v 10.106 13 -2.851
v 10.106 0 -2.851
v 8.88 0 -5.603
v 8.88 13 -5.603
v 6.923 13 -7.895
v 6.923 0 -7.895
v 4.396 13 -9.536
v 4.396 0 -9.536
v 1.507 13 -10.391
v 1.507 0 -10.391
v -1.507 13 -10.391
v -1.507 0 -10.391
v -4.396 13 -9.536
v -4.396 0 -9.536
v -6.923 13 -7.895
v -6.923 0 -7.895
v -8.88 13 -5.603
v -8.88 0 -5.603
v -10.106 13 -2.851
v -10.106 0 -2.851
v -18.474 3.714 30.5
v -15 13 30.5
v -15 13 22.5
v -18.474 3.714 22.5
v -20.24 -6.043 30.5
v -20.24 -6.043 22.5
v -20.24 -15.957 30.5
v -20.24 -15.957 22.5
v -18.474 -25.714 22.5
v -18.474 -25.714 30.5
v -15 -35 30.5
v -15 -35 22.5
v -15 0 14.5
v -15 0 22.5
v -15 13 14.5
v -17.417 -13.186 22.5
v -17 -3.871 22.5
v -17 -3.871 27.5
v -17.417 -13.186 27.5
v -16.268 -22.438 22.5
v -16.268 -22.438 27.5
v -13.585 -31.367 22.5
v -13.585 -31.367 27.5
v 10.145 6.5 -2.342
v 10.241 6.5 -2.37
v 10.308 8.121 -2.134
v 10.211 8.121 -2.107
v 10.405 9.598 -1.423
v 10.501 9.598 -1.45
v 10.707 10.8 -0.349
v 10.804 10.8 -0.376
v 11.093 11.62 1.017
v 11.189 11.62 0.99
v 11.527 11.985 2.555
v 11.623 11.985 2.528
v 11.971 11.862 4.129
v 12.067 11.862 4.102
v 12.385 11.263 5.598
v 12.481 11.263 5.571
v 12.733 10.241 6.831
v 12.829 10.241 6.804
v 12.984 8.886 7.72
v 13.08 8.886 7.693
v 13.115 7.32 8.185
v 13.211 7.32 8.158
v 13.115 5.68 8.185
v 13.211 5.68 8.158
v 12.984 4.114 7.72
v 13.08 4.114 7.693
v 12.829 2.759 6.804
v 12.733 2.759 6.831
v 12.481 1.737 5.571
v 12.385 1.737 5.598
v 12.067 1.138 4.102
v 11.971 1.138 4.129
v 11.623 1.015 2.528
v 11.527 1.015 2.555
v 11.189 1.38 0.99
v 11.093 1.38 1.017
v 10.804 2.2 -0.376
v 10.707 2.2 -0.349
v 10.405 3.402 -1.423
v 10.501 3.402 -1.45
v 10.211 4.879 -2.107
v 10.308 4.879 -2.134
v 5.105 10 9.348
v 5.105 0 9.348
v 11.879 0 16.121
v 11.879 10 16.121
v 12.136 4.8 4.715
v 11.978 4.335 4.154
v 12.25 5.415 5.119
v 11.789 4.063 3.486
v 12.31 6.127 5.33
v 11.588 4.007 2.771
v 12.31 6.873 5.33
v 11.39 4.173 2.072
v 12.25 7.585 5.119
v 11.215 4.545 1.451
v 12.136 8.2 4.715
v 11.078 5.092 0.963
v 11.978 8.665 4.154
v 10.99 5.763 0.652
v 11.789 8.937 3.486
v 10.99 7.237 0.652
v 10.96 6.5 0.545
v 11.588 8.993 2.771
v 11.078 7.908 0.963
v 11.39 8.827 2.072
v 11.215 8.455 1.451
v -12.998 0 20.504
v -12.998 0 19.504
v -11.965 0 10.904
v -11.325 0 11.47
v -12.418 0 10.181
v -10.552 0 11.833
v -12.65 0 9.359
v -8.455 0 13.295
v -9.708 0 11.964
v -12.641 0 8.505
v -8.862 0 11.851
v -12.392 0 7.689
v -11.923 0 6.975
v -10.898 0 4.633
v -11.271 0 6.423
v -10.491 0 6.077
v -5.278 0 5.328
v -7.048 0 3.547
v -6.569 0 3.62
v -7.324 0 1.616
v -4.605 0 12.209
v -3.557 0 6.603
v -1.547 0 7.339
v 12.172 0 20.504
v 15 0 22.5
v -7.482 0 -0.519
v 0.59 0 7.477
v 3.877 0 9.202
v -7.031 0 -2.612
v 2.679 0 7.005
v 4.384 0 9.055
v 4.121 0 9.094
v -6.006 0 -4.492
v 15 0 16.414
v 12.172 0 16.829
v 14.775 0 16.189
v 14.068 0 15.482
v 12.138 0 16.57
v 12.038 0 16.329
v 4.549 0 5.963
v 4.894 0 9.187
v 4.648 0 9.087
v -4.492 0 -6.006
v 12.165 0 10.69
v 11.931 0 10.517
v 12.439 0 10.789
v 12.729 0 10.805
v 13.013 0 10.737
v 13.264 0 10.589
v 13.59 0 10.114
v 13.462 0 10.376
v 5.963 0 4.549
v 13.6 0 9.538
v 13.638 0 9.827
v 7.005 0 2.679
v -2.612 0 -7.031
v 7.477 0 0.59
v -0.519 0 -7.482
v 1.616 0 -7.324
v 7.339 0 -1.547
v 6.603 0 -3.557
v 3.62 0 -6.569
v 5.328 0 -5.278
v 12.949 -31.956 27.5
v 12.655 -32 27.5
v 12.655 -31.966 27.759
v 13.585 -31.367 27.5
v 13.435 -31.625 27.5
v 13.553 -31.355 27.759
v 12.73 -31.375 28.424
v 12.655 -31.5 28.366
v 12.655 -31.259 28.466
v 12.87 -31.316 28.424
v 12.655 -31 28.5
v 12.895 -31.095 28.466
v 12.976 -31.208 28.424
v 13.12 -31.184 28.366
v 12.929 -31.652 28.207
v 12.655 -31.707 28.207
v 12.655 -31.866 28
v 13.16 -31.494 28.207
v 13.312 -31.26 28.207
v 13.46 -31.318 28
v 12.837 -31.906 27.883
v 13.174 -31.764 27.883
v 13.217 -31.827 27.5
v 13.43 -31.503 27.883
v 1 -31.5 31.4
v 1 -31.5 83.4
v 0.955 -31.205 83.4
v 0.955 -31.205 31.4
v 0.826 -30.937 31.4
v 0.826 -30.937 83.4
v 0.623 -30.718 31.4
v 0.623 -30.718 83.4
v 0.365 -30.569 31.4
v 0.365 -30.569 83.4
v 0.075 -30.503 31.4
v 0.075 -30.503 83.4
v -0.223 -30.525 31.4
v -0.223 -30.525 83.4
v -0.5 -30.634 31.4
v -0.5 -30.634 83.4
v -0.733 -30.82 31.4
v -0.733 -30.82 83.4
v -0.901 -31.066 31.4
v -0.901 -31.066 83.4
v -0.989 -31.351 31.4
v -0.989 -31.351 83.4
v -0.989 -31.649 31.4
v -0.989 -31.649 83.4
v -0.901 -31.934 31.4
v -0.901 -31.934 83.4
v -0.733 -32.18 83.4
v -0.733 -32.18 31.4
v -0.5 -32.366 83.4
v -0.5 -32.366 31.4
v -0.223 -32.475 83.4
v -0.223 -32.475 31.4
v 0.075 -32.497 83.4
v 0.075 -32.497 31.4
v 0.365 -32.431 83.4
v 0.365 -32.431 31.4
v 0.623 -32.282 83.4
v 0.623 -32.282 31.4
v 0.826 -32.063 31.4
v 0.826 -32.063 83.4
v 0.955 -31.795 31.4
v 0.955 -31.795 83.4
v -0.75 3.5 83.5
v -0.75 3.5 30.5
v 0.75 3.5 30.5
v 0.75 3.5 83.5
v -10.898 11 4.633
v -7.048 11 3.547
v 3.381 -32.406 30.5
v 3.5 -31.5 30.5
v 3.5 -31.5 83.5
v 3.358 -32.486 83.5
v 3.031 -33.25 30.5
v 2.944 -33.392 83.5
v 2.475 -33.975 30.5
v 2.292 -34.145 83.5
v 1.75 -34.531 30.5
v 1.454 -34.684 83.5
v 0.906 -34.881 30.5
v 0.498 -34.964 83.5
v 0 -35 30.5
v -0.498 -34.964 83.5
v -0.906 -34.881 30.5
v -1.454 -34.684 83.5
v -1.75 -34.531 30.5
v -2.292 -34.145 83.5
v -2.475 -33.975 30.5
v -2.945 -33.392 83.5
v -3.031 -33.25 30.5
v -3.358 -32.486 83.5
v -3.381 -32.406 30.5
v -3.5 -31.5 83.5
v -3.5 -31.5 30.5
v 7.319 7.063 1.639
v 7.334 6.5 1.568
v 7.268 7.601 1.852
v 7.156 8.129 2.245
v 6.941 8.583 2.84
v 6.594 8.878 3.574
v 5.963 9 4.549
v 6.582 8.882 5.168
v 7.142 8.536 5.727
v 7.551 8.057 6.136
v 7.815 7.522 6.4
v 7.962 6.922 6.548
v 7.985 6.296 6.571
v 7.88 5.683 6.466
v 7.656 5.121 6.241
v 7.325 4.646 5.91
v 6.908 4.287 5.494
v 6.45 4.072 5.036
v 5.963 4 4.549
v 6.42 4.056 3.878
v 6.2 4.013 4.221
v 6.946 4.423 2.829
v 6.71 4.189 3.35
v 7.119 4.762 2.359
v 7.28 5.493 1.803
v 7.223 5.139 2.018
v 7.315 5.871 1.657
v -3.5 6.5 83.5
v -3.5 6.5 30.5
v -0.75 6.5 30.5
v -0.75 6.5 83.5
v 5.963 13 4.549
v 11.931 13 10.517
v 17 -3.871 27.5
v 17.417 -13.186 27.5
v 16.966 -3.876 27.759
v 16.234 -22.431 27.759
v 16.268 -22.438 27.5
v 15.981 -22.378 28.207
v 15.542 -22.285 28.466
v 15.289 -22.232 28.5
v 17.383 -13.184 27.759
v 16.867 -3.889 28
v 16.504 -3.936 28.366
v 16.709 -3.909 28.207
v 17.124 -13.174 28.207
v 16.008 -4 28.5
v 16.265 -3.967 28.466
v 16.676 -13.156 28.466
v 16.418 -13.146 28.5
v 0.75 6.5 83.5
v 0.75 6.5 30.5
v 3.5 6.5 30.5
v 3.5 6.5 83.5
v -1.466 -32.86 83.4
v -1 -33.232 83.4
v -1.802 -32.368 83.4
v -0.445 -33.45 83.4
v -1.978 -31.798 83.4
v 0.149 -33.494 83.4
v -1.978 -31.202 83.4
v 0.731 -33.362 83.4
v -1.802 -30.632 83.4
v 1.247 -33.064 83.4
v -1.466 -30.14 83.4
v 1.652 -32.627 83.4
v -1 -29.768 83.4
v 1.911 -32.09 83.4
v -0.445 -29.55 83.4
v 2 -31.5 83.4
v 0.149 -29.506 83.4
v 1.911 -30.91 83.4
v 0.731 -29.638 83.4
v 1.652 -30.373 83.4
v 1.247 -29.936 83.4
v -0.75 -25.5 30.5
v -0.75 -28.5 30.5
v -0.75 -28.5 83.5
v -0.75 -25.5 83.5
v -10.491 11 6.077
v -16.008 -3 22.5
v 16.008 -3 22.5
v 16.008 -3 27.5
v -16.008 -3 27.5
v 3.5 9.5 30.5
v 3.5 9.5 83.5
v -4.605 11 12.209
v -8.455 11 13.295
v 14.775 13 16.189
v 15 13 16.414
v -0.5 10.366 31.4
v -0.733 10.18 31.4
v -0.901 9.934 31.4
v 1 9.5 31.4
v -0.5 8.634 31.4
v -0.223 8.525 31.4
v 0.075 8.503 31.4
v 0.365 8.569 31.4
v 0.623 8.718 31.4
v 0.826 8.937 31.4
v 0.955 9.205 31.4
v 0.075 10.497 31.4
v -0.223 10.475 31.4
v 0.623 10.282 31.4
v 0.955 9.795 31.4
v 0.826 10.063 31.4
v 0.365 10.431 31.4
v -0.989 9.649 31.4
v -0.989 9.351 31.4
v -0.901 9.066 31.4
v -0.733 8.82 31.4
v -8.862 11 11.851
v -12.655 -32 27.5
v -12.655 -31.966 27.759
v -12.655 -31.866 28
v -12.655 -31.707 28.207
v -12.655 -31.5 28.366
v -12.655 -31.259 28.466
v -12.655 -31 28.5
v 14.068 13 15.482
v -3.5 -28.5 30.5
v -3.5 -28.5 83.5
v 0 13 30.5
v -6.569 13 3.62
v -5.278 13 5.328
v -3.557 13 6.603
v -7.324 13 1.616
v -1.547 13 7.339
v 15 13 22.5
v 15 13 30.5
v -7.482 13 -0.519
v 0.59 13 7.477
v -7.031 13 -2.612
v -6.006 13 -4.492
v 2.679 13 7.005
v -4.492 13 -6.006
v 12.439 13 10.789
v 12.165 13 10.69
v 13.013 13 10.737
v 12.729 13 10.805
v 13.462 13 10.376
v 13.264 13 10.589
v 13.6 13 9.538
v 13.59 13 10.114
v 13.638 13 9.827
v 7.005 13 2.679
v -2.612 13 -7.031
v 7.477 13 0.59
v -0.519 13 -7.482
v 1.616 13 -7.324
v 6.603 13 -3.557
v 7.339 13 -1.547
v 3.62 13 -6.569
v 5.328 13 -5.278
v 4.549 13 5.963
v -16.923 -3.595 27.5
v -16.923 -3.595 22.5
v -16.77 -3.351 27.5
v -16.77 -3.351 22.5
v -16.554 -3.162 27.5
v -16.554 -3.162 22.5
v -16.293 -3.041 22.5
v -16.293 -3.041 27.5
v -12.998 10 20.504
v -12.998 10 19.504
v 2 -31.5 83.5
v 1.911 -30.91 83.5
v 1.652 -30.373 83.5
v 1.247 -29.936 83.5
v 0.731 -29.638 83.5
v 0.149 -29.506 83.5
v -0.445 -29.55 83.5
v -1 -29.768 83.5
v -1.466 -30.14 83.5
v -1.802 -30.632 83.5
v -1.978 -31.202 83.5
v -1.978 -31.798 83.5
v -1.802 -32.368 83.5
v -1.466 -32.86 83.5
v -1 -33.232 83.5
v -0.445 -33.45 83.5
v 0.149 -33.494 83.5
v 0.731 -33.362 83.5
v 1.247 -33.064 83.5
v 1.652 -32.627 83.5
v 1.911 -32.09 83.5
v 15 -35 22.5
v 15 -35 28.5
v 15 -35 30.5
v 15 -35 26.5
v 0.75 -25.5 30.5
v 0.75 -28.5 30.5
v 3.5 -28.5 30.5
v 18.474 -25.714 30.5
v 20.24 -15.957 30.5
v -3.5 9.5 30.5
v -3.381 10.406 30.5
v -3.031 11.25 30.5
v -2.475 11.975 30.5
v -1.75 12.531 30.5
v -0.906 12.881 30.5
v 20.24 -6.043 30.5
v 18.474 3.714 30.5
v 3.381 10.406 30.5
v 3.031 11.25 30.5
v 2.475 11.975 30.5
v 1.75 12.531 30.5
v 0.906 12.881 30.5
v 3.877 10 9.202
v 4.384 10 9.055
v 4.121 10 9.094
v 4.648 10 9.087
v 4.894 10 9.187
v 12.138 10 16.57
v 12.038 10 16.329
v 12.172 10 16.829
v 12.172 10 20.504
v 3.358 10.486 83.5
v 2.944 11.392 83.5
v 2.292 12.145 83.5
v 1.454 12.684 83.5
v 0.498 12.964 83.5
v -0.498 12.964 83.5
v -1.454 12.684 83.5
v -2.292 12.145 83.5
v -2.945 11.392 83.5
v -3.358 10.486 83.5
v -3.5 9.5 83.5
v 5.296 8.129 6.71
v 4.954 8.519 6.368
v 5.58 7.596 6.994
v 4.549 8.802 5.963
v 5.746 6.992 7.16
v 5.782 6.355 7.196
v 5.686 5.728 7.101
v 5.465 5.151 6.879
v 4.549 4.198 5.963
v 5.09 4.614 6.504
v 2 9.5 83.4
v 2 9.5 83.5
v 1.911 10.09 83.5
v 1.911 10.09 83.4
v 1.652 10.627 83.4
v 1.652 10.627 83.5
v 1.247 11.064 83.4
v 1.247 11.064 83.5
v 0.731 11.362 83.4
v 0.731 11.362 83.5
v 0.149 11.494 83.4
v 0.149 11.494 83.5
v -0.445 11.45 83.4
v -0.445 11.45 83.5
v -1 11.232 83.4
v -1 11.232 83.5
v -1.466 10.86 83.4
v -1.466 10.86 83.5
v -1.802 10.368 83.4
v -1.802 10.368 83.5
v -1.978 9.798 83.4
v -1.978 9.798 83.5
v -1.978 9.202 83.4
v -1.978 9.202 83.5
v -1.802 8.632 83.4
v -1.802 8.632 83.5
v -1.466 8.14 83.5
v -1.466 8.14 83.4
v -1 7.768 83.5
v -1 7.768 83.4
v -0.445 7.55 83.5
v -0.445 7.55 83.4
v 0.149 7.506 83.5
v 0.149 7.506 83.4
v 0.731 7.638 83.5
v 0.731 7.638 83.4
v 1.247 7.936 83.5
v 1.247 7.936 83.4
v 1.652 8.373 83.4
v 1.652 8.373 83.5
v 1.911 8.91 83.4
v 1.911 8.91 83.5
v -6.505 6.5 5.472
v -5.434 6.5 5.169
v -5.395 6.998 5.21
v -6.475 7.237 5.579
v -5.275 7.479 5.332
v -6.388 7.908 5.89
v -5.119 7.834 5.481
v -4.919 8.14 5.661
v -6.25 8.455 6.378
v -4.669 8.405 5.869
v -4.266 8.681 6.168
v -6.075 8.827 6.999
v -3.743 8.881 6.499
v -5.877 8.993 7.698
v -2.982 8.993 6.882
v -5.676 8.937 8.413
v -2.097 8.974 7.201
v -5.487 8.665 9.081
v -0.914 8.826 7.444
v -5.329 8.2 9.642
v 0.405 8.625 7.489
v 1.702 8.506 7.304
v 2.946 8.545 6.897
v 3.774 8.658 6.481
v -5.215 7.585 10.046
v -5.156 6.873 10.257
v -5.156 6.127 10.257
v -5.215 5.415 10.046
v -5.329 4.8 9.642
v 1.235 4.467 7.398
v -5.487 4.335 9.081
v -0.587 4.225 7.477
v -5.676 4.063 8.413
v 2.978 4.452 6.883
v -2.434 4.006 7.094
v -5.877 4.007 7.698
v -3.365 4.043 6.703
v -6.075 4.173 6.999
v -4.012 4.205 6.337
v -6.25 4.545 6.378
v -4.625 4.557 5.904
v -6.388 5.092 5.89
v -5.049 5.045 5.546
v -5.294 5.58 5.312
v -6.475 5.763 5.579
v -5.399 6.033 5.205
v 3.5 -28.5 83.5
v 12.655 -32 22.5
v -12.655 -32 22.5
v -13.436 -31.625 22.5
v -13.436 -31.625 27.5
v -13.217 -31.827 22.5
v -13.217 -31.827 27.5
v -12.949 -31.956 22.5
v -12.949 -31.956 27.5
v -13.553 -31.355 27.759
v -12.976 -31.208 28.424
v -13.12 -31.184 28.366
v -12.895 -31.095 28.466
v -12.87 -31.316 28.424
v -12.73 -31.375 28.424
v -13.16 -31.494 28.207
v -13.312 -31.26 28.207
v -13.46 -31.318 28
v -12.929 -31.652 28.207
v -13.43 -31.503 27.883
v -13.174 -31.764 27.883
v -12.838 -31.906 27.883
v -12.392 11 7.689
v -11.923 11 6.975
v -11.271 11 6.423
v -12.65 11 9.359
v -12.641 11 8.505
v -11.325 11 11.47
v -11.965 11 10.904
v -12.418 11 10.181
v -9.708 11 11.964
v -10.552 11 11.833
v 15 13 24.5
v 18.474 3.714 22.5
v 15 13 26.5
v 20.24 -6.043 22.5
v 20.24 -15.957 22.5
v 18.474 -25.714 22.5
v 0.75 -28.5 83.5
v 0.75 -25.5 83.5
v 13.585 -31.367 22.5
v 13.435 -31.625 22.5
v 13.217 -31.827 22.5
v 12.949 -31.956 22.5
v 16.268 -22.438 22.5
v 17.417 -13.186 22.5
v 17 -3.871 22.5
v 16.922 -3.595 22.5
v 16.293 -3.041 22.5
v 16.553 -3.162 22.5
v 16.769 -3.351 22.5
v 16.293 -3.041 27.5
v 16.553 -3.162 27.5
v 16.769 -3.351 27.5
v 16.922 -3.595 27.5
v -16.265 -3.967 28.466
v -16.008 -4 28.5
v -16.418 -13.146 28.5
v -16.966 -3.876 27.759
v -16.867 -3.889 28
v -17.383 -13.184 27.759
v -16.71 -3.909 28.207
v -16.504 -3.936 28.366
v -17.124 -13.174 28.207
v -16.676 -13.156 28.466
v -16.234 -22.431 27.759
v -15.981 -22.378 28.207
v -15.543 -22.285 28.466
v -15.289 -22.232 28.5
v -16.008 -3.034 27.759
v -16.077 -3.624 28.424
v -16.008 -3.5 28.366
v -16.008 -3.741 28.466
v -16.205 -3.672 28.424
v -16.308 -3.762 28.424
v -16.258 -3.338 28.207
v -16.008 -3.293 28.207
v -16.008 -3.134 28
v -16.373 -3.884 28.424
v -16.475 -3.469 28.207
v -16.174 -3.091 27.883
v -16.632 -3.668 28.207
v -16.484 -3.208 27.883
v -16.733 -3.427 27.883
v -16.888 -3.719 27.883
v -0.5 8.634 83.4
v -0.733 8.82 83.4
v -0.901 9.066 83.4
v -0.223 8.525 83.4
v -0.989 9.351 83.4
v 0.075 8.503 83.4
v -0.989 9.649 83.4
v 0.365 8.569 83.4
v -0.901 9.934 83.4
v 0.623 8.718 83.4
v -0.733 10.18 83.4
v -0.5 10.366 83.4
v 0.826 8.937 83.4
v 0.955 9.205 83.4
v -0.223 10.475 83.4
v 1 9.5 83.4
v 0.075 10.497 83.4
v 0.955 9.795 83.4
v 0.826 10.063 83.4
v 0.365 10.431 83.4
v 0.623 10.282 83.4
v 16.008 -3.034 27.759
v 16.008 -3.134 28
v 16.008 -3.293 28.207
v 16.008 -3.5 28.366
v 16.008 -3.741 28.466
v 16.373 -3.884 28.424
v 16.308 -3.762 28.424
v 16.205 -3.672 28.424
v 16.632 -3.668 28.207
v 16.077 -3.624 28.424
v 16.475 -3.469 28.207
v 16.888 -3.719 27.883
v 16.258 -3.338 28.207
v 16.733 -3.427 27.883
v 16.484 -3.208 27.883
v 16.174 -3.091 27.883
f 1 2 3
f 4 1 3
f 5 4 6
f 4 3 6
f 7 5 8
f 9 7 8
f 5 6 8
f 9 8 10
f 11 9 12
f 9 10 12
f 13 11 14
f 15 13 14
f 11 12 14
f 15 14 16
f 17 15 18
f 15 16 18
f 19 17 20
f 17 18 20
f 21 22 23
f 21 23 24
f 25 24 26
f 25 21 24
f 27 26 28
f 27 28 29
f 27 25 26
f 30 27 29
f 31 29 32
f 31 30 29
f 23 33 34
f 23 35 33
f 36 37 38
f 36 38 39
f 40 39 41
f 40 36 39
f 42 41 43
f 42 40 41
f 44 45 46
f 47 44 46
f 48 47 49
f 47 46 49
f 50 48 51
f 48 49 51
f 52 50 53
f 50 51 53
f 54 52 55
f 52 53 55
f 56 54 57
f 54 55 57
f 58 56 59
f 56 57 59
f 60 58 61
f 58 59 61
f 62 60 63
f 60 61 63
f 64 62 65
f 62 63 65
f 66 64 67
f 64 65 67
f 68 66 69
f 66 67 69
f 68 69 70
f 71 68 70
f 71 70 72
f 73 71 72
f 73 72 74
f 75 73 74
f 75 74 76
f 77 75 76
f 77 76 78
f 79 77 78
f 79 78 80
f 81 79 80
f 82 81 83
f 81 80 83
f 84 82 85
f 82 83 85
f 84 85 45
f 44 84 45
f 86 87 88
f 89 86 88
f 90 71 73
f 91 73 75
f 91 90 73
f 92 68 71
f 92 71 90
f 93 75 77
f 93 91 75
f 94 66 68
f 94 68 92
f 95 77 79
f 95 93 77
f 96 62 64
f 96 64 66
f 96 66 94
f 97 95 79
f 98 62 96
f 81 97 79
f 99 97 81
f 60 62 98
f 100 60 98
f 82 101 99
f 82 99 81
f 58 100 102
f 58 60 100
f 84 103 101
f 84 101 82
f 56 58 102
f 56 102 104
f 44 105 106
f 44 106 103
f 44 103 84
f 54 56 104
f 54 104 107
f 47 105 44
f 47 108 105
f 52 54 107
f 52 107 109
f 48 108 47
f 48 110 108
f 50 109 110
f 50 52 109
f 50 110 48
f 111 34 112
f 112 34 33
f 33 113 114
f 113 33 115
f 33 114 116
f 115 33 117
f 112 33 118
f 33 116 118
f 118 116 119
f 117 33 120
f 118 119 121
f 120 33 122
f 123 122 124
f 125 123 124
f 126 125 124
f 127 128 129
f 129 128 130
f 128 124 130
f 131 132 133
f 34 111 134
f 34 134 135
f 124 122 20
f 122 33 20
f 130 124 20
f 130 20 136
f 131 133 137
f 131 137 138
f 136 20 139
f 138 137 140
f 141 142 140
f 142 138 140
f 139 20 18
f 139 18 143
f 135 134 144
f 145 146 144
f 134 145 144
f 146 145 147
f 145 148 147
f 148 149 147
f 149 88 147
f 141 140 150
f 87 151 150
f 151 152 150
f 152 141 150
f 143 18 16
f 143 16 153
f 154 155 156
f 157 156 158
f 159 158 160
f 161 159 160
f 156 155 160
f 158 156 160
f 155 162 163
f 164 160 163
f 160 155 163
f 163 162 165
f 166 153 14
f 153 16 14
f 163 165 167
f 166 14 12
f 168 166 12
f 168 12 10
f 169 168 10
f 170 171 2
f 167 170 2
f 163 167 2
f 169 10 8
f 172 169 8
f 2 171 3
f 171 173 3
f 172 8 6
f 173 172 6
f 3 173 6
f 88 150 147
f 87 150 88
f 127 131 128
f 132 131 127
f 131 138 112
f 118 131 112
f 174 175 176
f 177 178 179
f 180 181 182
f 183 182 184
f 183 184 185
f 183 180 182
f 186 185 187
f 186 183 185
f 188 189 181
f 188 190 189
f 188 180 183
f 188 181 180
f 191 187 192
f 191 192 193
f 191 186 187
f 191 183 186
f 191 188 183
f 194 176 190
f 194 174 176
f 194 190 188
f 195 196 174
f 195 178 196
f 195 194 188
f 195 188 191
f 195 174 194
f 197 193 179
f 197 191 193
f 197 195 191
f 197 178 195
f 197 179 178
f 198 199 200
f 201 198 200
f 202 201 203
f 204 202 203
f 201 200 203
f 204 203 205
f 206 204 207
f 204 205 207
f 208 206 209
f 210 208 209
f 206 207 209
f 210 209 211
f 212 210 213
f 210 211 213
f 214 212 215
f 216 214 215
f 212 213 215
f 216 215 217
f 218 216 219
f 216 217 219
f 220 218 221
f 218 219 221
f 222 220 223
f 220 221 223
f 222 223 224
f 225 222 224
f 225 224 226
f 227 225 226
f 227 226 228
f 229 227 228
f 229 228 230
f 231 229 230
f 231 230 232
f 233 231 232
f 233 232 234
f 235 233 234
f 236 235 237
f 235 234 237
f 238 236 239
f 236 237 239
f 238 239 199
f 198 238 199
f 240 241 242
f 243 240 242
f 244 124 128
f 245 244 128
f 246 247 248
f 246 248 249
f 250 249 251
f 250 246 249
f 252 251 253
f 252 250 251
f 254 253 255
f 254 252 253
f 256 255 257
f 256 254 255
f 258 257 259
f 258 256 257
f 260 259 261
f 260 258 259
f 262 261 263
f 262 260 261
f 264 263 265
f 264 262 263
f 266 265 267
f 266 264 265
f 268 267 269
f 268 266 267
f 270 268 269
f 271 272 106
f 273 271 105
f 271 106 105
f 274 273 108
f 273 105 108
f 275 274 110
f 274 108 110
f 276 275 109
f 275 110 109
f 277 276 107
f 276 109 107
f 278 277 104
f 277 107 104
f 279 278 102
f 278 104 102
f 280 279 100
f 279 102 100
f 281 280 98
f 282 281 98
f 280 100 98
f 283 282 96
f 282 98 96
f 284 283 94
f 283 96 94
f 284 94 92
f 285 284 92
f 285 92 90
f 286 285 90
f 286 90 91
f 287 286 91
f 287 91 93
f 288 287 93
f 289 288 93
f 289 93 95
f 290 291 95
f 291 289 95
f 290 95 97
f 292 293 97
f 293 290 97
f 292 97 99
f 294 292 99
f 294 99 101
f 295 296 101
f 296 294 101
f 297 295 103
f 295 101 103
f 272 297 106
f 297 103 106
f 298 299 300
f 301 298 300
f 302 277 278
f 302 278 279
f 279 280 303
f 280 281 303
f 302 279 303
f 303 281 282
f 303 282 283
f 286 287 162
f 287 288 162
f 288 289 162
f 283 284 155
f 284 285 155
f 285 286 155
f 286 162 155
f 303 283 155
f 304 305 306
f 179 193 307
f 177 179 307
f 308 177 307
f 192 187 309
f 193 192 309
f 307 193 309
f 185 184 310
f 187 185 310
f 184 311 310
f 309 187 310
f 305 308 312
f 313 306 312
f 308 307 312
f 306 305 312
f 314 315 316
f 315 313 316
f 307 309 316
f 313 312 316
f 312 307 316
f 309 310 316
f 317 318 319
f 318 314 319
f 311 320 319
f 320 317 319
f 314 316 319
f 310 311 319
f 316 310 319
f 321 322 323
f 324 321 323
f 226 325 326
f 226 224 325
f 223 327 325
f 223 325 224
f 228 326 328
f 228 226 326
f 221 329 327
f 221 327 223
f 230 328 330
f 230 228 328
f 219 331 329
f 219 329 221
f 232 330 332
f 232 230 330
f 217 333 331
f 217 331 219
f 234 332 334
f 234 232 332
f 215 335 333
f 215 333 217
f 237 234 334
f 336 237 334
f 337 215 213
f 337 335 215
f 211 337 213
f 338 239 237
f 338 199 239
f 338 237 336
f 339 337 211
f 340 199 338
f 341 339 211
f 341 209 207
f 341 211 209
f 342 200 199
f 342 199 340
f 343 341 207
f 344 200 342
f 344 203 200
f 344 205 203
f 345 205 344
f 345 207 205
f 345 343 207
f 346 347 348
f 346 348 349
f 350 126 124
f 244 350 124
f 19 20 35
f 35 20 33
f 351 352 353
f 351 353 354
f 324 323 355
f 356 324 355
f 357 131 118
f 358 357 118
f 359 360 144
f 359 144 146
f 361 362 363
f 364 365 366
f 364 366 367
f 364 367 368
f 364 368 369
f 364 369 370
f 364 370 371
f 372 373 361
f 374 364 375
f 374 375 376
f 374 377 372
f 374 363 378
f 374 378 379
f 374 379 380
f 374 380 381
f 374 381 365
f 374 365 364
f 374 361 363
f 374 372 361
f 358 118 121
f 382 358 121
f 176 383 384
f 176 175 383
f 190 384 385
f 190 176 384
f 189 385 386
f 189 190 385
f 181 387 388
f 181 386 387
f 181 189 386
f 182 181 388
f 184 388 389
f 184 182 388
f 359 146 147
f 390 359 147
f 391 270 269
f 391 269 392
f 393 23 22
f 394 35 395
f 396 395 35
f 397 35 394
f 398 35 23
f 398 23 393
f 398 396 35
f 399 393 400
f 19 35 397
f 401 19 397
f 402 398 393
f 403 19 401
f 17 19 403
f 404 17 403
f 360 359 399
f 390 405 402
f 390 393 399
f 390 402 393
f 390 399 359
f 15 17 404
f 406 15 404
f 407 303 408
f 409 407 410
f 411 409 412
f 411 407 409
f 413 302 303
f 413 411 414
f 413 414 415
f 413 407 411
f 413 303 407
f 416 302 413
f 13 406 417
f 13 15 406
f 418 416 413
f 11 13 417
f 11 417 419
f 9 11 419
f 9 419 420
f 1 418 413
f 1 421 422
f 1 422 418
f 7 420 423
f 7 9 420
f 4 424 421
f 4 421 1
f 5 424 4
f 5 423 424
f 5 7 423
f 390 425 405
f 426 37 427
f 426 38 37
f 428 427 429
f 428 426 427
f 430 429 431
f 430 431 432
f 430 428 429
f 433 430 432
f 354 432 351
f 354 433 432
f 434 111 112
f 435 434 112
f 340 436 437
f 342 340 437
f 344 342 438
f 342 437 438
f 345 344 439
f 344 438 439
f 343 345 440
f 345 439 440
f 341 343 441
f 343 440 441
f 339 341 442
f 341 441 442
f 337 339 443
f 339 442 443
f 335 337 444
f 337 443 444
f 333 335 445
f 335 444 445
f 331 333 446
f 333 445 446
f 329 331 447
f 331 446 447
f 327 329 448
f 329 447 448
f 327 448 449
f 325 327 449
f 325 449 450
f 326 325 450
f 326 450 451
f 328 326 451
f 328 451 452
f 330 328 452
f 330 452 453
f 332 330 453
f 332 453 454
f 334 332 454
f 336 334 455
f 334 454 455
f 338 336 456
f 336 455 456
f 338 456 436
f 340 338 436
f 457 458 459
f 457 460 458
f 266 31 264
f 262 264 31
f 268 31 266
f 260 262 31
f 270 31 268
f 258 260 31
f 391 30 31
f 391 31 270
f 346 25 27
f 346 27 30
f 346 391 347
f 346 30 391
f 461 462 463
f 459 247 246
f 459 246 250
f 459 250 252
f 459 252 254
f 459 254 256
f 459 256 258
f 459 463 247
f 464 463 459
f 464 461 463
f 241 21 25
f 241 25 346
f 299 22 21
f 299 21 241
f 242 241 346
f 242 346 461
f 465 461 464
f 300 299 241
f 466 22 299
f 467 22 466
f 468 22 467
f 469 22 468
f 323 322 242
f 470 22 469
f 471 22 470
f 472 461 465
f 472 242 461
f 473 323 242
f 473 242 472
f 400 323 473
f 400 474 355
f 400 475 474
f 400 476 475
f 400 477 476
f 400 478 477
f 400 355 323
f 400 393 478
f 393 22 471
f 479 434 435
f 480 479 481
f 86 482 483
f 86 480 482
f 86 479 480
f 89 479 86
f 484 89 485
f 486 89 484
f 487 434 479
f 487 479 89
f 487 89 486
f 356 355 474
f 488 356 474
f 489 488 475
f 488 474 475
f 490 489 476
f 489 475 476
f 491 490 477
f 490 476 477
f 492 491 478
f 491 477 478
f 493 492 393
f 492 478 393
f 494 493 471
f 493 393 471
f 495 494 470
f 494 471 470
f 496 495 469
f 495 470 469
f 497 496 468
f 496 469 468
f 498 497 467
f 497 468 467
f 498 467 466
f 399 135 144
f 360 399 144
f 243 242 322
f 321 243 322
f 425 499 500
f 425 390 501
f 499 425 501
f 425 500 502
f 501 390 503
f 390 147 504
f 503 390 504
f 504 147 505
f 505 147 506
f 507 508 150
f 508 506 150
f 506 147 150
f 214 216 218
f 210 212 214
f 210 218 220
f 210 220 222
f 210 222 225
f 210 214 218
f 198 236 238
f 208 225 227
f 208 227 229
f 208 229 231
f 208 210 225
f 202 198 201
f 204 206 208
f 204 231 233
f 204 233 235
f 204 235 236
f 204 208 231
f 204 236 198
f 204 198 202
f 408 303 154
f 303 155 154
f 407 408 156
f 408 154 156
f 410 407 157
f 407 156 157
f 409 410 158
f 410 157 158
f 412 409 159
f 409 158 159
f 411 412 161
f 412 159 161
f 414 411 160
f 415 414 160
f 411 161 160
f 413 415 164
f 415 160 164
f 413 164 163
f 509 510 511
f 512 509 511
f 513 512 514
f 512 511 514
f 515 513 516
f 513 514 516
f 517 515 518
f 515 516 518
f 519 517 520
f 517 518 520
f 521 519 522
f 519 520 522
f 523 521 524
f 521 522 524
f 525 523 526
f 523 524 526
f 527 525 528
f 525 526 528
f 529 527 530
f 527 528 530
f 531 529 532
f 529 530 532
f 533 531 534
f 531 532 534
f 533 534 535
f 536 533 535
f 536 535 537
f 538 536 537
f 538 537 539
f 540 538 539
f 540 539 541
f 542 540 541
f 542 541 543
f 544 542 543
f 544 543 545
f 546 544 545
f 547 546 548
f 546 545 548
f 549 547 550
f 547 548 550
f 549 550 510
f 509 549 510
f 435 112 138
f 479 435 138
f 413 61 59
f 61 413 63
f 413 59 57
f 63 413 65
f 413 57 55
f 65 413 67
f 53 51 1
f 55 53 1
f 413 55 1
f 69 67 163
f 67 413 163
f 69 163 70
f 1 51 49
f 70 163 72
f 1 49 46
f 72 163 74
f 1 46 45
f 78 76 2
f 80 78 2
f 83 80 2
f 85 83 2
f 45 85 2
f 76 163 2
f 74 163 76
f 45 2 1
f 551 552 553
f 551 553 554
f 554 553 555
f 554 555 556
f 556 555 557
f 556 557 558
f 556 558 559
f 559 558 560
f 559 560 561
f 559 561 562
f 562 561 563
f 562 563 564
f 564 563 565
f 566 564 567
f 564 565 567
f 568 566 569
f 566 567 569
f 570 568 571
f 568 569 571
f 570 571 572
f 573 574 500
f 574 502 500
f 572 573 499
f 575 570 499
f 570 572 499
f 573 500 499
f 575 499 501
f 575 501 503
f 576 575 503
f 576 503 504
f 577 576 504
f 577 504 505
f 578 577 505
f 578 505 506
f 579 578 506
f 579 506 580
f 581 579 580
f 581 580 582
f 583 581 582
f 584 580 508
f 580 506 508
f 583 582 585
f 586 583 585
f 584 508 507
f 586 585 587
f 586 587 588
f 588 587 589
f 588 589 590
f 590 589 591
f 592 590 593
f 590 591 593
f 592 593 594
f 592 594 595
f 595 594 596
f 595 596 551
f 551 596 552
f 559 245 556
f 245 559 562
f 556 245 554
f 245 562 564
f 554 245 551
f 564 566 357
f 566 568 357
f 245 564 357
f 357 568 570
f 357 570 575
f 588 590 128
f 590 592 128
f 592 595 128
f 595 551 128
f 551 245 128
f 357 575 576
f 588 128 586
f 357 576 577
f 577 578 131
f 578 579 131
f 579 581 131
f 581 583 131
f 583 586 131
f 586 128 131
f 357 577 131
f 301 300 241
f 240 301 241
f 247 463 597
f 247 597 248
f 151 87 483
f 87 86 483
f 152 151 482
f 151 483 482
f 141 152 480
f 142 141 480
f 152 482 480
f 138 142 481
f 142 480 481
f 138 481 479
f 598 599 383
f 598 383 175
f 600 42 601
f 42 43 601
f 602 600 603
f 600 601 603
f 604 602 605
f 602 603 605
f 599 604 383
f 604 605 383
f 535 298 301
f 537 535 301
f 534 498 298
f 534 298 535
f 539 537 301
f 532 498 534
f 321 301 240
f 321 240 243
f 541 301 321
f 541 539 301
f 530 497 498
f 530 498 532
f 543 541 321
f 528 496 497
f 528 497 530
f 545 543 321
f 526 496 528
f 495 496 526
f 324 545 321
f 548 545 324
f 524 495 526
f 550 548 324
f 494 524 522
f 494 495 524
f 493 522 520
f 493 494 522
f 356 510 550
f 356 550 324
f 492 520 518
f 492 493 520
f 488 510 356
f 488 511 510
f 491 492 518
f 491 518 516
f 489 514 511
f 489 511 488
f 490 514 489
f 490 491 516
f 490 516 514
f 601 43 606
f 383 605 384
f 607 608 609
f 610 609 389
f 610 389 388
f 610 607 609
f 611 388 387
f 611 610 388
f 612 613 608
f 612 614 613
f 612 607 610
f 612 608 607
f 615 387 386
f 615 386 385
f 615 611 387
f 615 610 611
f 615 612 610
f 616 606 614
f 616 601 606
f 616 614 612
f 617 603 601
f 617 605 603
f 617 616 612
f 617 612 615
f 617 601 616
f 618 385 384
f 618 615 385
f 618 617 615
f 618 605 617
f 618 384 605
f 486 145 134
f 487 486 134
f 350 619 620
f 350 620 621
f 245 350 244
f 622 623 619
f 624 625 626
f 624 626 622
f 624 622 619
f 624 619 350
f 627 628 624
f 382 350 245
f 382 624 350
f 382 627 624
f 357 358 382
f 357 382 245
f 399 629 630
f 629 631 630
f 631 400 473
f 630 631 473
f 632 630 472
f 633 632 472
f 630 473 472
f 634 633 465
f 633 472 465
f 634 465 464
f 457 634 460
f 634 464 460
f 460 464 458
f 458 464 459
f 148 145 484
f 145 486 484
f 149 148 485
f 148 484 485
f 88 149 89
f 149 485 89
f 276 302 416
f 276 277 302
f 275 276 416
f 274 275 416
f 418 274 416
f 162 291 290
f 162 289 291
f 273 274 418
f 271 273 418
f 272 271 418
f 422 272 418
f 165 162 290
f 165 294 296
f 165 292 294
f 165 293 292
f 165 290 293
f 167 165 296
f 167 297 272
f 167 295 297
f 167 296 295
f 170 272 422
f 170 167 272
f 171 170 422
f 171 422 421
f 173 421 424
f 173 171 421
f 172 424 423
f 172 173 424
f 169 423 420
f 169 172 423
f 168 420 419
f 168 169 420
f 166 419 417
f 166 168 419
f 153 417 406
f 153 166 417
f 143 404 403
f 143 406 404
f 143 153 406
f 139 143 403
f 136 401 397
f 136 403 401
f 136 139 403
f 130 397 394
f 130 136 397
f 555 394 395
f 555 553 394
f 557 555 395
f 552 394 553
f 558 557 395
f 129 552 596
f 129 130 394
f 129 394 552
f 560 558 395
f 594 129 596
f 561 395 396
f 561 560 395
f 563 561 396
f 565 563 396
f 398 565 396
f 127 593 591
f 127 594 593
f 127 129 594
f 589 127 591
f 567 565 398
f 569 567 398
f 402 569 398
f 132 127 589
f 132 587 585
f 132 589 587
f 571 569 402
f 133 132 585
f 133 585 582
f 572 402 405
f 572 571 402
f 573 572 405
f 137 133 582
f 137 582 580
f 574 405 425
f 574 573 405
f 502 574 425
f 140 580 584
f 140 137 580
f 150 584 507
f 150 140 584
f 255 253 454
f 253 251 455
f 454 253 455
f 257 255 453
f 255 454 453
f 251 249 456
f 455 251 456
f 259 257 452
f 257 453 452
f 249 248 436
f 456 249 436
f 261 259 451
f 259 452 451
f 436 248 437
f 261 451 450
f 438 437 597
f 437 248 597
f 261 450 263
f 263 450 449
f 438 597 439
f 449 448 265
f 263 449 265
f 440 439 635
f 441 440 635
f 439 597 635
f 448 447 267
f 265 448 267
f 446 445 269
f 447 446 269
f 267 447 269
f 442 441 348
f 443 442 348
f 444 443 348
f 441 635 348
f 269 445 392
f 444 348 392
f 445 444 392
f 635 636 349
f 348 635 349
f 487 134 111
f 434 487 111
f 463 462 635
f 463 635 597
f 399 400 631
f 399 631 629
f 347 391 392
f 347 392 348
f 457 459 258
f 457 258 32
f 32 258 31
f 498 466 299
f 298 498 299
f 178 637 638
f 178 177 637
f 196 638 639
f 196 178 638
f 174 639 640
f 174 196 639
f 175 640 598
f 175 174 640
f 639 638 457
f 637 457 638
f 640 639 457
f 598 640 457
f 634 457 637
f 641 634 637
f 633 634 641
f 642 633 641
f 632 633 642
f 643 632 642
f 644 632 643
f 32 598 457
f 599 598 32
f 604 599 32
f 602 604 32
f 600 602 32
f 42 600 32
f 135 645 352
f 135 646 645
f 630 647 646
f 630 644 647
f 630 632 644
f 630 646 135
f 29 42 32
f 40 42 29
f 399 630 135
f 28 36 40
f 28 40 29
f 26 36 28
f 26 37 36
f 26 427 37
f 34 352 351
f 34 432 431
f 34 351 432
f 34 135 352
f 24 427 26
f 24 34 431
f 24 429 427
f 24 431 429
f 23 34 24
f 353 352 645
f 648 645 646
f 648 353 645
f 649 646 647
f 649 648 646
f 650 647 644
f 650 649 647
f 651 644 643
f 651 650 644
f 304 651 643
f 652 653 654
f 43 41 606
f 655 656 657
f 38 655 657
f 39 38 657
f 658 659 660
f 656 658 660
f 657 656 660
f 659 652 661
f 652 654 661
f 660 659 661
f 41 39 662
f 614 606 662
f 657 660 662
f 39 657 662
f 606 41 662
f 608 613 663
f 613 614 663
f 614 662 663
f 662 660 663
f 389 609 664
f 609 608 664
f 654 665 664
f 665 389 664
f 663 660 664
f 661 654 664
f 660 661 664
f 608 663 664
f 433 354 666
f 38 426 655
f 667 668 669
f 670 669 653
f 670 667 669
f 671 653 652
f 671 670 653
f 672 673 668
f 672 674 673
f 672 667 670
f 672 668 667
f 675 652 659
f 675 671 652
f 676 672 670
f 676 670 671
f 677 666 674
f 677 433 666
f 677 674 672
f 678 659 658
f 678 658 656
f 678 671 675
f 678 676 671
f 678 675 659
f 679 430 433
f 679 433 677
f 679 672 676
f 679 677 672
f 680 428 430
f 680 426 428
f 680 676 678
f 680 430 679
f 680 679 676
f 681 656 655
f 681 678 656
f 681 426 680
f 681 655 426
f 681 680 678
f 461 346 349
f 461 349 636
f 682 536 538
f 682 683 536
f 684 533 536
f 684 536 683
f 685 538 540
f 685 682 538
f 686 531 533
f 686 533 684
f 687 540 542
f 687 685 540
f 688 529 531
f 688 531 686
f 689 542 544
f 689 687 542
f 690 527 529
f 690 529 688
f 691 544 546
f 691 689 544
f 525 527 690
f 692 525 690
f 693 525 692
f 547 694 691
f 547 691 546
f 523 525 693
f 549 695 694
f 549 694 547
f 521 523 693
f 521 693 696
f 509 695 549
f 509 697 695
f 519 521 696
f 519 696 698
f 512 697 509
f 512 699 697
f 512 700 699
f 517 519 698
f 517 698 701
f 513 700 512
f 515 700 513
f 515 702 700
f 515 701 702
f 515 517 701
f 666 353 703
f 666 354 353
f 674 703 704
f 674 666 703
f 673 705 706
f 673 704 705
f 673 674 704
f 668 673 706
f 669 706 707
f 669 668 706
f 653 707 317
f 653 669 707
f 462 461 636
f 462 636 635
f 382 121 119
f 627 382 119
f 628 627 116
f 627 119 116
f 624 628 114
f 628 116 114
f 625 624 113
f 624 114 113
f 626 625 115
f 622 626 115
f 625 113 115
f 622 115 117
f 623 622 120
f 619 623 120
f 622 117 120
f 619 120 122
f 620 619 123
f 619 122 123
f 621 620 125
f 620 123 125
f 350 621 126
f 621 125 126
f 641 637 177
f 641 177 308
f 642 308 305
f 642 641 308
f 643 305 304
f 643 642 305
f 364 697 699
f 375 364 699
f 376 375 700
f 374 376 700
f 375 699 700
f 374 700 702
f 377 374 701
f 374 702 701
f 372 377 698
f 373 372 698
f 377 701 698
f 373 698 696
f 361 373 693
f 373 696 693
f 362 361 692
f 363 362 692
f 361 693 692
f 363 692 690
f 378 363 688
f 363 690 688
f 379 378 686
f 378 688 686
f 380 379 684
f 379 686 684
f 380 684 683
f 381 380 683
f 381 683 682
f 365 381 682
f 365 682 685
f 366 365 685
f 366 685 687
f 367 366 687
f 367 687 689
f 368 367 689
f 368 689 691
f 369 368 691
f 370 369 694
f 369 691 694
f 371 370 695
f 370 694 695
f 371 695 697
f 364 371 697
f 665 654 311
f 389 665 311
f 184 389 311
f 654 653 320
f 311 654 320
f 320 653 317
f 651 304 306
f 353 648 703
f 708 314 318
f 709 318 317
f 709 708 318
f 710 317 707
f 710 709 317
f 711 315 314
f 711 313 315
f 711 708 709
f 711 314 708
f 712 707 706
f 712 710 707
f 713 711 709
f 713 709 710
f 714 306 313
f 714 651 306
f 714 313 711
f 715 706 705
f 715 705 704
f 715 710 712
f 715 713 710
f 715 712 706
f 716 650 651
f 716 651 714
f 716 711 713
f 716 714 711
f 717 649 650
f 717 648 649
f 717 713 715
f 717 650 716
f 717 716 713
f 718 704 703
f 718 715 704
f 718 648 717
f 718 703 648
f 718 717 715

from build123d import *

# Parameters (mm, degrees)
SKETCH1_R               = 7.5
BOSS_EXTRUDE1_DEPTH     = 13
BOSS_EXTRUDE2_DEPTH     = 13
BOSS_EXTRUDE3_DEPTH     = 35
BOSS_EXTRUDE4_DEPTH     = 8
CUT_EXTRUDE3_DEPTH      = 6
CUT_EXTRUDE3_DEPTH_BACK = 6
BOSS_EXTRUDE5_DEPTH     = 53
SKETCH11_R              = 2
CUT_EXTRUDE4_DEPTH      = 0.1
SKETCH12_R              = 1
CUT_EXTRUDE5_DEPTH      = 52
SKETCH16_R              = 5.5
CUT_EXTRUDE8_DEPTH      = 0.1
SKETCH17_R              = 2.5
CUT_EXTRUDE9_DEPTH      = 20.1
CUT_EXTRUDE10_DEPTH     = 11
CUT_EXTRUDE11_DEPTH     = 25
CUT_EXTRUDE12_DEPTH     = 10
FILLET1_R               = 1


with BuildPart() as part:
    # Sketch1 → Boss-Extrude1 (new body)
    with BuildSketch(Plane(origin=(0, 0, 0), x_dir=(1, 0, 0), z_dir=(0, 1, 0))):
        with BuildLine():
            Line((-15.000119656, -22.499966246), (15.000119656, -22.499966246))
            Line((15.000119656, -22.499966246), (15.000119656, -14.499966246))
            Line((15.000119656, -14.499966246), (10.105611377, 2.850722488))
            ThreePointArc((10.105611377, 2.850722488), (0, 10.5), (-10.105611377, 2.850722488))
            Line((-10.105611377, 2.850722488), (-15.000119656, -14.499966246))
            Line((-15.000119656, -14.499966246), (-15.000119656, -22.499966246))
        make_face()
        with Locations(Location((0, 0, 0), (0, 0, 90))):
            Circle(SKETCH1_R, mode=Mode.SUBTRACT)
    extrude(amount=BOSS_EXTRUDE1_DEPTH)

    # Sketch2 → Boss-Extrude2 (add)
    with BuildSketch(Plane(origin=(0, 0, 0), x_dir=(1, 0, 0), z_dir=(0, 1, 0))):
        Polygon((-15.000119656, -22.499966246), (-15.000119656, -30.499966246), (14.999880344, -30.499966246), (15.000119656, -22.499966246), align=None)
    extrude(amount=BOSS_EXTRUDE2_DEPTH)

    # Sketch3 → Boss-Extrude3 (add)
    with BuildSketch(Plane.XZ):
        Polygon((-15.000119656, 30.499966246), (14.999880344, 30.499966246), (15.000119656, 22.499966246), (-15.000119656, 22.499966246), align=None)
    extrude(amount=BOSS_EXTRUDE3_DEPTH)

    # Sketch4 → Boss-Extrude4 (add)
    with BuildSketch(Plane.XY.offset(30.499966246)):
        with BuildLine():
            Line((14.999880344, -35), (14.999880344, 13))
            ThreePointArc((14.999880344, 13), (20.461578839, -11), (14.999880344, -35))
        make_face()
        with BuildLine():
            Line((-15.000119656, -35), (-15.000119656, 13))
            ThreePointArc((-15.000119656, 13), (-20.461818151, -11), (-15.000119656, -35))
        make_face()
    extrude(amount=-BOSS_EXTRUDE4_DEPTH)

    # Sketch9 → Cut-Extrude3 (cut, two sides: drawn at the far end of the back side and taken through both)
    with BuildSketch(Plane.XY.offset(22.5).offset(-CUT_EXTRUDE3_DEPTH_BACK)):
        with BuildLine():
            Line((-13.33053559, -32), (11.997996308, -32))
            Line((11.997996308, -32), (13.330296278, -32))
            ThreePointArc((13.330296278, -32), (17.049056164, -17.737940448), (16.879854834, -3))
            Line((16.879854834, -3), (15, -3))
            Line((15, -3), (-16.880094146, -3))
            ThreePointArc((-16.880094146, -3), (-17.049295477, -17.737940448), (-13.33053559, -32))
        make_face()
    extrude(amount=CUT_EXTRUDE3_DEPTH + CUT_EXTRUDE3_DEPTH_BACK, mode=Mode.SUBTRACT)

    # Sketch10 → Boss-Extrude5 (add)
    with BuildSketch(Plane.XY.offset(30.499966246)):
        with BuildLine():
            Line((-3.500119656, -28.5), (-0.750119656, -28.5))
            Line((-0.750119656, -28.5), (-0.750119656, -25.5))
            Line((-0.750119656, -25.5), (-0.000119656, -25.5))
            Line((-0.000119656, -25.5), (0.749880344, -25.5))
            Line((0.749880344, -25.5), (0.749880344, -28.5))
            Line((0.749880344, -28.5), (3.499880344, -28.5))
            Line((3.499880344, -28.5), (3.499880344, -31.5))
            ThreePointArc((3.499880344, -31.5), (-0.000119656, -35), (-3.500119656, -31.5))
            Line((-3.500119656, -31.5), (-3.500119656, -28.5))
        make_face()
        with BuildLine():
            Line((0.749880344, 6.5), (3.499880344, 6.5))
            Line((3.499880344, 6.5), (3.499880344, 9.5))
            ThreePointArc((3.499880344, 9.5), (-0.000119656, 13), (-3.500119656, 9.5))
            Line((-3.500119656, 9.5), (-3.500119656, 6.5))
            Line((-3.500119656, 6.5), (-0.750119656, 6.5))
            Line((-0.750119656, 6.5), (-0.750119656, 3.5))
            Line((-0.750119656, 3.5), (-0.000119656, 3.5))
            Line((-0.000119656, 3.5), (0.749880344, 3.5))
            Line((0.749880344, 3.5), (0.749880344, 6.5))
        make_face()
    extrude(amount=BOSS_EXTRUDE5_DEPTH)

    # Sketch11 → Cut-Extrude4 (cut)
    with BuildSketch(Plane.XY.offset(83.499966246)):
        with Locations((-0.000119656, -31.5)):
            Circle(SKETCH11_R)
        with Locations((-0.000119656, 9.5)):
            Circle(SKETCH11_R)
    extrude(amount=-CUT_EXTRUDE4_DEPTH, mode=Mode.SUBTRACT)

    # Sketch12 → Cut-Extrude5 (cut)
    with BuildSketch(Plane.XY.offset(83.399966246)):
        with Locations((-0.000119656, -31.5)):
            Circle(SKETCH12_R)
        with Locations((-0.000119656, 9.5)):
            Circle(SKETCH12_R)
    extrude(amount=-CUT_EXTRUDE5_DEPTH, mode=Mode.SUBTRACT)

    # Sketch16 → Cut-Extrude8 (cut)
    with BuildSketch(Plane(origin=(10.105611377, 0, -2.850722488), x_dir=(-0.27149737978458055, 0, -0.9624391787381202), z_dir=(0.9624391787381201, 0, -0.2714973797845805))):
        with Locations((-6, 6.5)):
            Circle(SKETCH16_R)
    extrude(amount=-CUT_EXTRUDE8_DEPTH, mode=Mode.SUBTRACT)

    # Sketch17 → Cut-Extrude9 (cut)
    with BuildSketch(Plane(origin=(10.009367459, 0, -2.82357275), x_dir=(-0.2714973797845806, 0, -0.9624391787381202), z_dir=(0.9624391787381201, 0, -0.27149737978458055))):
        with Locations((-6, 6.5)):
            Circle(SKETCH17_R)
    extrude(amount=-CUT_EXTRUDE9_DEPTH, mode=Mode.SUBTRACT)

    # Sketch18 → Cut-Extrude10 (cut)
    with BuildSketch(Plane.XZ):
        with BuildLine():
            Line((-8.45474492, 13.294804883), (-8.86199099, 11.851146114))
            ThreePointArc((-8.86199099, 11.851146114), (-12.563800666, 9.778320718), (-10.490975269, 6.076511042))
            Line((-10.490975269, 6.076511042), (-10.898221339, 4.632852274))
            Line((-10.898221339, 4.632852274), (-7.048464624, 3.546862755))
            Line((-7.048464624, 3.546862755), (-4.604988206, 12.208815363))
            Line((-4.604988206, 12.208815363), (-8.45474492, 13.294804883))
        make_face()
    extrude(amount=-CUT_EXTRUDE10_DEPTH, mode=Mode.SUBTRACT)

    # Sketch19 → Cut-Extrude11 (cut)
    with BuildSketch(Plane.XZ):
        Polygon((16.189167047, 14.774953484), (16.896273828, 15.482060265), (15.482060265, 16.896273828), (14.774953484, 16.189167047), (14.067846703, 15.482060265), (3.042893219, 4.457106781), (4.457106781, 3.042893219), (15.482060265, 14.067846703), align=None)
    extrude(amount=-CUT_EXTRUDE11_DEPTH, mode=Mode.SUBTRACT)

    # Sketch20 → Cut-Extrude12 (cut)
    with BuildSketch(Plane.XZ):
        Polygon((-12.998307469, 20.504333218), (-12.998307469, 19.504333218), (4.548842229, 8.791482916), (12.171692531, 16.414333218), (12.171692531, 20.504333218), align=None)
    extrude(amount=-CUT_EXTRUDE12_DEPTH, mode=Mode.SUBTRACT)

    # Fillet1
    fillet1_edges = [part.edges().sort_by_distance(p)[0] for p in [
        (14.640950567, 6.5, 13.226737005),
        (12.171692531, 5, 16.414333218),
        (4.548842229, 5, 8.791482916),
        (-13.33053559, -32, 25.499983123),
        (-17.049295477, -17.737940448, 28.5),
        (-16.880094146, -3, 25.499983123),
        (-0.000119656, -3, 28.5),
        (16.879854834, -3, 25.499983123),
        (13.330296278, -32, 25.499983123),
        (-0.000119656, -32, 28.5),
        (17.049056164, -17.737940448, 28.5),
    ]]
    fillet(fillet1_edges, radius=FILLET1_R)


solid = part.part
